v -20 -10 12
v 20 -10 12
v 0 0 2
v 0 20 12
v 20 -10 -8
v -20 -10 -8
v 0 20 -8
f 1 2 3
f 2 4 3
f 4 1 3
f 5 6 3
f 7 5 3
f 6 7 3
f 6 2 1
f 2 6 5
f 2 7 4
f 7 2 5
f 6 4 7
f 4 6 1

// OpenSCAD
translate([20, 0, 0])
color([0.9, 0.4, 0.4])
!translate([0, 0, 2]) scale(10) polyhedron(
    points=[
        [ 0, 0,  0],

        [-2,-1, +1],
        [+2,-1, +1],
        [ 0,+2, +1],

        [-2,-1, -1],
        [+2,-1, -1],
        [ 0,+2, -1],
    ],
    faces=[
        [0, 2, 1],
        [0, 3, 2],
        [0, 1, 3],

        [0, 4, 5],
        [0, 5, 6],
        [0, 6, 4],

        [1, 2, 5, 4],
        [2, 3, 6, 5],
        [3, 1, 4, 6],
    ]
);
